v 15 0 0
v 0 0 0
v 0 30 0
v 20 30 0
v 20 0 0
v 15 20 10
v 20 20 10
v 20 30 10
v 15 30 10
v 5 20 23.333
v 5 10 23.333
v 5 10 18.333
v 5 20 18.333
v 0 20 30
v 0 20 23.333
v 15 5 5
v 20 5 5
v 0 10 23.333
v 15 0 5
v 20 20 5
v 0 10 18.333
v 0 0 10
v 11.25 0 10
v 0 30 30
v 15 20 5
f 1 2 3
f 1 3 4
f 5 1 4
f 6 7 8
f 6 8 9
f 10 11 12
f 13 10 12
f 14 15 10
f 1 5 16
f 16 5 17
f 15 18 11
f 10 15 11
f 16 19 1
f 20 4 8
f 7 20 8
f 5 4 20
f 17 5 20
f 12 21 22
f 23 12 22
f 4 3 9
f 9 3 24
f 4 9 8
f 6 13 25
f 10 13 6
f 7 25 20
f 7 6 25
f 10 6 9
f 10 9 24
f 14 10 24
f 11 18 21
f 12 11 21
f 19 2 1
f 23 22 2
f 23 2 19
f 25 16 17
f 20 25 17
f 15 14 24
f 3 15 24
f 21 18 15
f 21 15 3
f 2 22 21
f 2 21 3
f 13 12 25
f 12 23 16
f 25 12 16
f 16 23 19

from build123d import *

# Parameters (mm, degrees)
F1_DEPTH = 30
F3_DEPTH = 20
F5_DEPTH = 20.001
F7_DEPTH = 5


with BuildPart() as f1:
    # F0 (on Front) → F1 (new body)
    with BuildSketch(Plane.XZ):
        Polygon((0, 30), (0, 0), (20, 0), (20, 10), (15, 10), align=None)
    extrude(amount=-F1_DEPTH)

    # F2 (on face) → F3 (cut)
    with BuildSketch(Plane.XZ):
        Polygon((0, 30), (0, 23.3333333333), (5, 23.3333333333), align=None)
        Polygon((15, 10), (5, 23.3333333333), (5, 18.3333333333), (15, 5), (20, 5), (20, 10), align=None)
    extrude(amount=-F3_DEPTH, mode=Mode.SUBTRACT)

    # F4 (on face) → F5 (cut, through all)
    with BuildSketch(Plane(origin=(0, 0, 0), x_dir=(0, -1, 0), z_dir=(-1, 0, 0))):
        Polygon((0, 23.3333333333), (-10, 23.3333333333), (-10, 18.3333333333), (0, 10), align=None)
    extrude(amount=-F5_DEPTH, mode=Mode.SUBTRACT)

    # F6 (on face) → F7 (cut, through all)
    with BuildSketch(Plane.YZ.offset(20)):
        Polygon((0, 5), (0, 0), (5, 5), align=None)
    extrude(amount=-F7_DEPTH, mode=Mode.SUBTRACT)


solid = f1.part
